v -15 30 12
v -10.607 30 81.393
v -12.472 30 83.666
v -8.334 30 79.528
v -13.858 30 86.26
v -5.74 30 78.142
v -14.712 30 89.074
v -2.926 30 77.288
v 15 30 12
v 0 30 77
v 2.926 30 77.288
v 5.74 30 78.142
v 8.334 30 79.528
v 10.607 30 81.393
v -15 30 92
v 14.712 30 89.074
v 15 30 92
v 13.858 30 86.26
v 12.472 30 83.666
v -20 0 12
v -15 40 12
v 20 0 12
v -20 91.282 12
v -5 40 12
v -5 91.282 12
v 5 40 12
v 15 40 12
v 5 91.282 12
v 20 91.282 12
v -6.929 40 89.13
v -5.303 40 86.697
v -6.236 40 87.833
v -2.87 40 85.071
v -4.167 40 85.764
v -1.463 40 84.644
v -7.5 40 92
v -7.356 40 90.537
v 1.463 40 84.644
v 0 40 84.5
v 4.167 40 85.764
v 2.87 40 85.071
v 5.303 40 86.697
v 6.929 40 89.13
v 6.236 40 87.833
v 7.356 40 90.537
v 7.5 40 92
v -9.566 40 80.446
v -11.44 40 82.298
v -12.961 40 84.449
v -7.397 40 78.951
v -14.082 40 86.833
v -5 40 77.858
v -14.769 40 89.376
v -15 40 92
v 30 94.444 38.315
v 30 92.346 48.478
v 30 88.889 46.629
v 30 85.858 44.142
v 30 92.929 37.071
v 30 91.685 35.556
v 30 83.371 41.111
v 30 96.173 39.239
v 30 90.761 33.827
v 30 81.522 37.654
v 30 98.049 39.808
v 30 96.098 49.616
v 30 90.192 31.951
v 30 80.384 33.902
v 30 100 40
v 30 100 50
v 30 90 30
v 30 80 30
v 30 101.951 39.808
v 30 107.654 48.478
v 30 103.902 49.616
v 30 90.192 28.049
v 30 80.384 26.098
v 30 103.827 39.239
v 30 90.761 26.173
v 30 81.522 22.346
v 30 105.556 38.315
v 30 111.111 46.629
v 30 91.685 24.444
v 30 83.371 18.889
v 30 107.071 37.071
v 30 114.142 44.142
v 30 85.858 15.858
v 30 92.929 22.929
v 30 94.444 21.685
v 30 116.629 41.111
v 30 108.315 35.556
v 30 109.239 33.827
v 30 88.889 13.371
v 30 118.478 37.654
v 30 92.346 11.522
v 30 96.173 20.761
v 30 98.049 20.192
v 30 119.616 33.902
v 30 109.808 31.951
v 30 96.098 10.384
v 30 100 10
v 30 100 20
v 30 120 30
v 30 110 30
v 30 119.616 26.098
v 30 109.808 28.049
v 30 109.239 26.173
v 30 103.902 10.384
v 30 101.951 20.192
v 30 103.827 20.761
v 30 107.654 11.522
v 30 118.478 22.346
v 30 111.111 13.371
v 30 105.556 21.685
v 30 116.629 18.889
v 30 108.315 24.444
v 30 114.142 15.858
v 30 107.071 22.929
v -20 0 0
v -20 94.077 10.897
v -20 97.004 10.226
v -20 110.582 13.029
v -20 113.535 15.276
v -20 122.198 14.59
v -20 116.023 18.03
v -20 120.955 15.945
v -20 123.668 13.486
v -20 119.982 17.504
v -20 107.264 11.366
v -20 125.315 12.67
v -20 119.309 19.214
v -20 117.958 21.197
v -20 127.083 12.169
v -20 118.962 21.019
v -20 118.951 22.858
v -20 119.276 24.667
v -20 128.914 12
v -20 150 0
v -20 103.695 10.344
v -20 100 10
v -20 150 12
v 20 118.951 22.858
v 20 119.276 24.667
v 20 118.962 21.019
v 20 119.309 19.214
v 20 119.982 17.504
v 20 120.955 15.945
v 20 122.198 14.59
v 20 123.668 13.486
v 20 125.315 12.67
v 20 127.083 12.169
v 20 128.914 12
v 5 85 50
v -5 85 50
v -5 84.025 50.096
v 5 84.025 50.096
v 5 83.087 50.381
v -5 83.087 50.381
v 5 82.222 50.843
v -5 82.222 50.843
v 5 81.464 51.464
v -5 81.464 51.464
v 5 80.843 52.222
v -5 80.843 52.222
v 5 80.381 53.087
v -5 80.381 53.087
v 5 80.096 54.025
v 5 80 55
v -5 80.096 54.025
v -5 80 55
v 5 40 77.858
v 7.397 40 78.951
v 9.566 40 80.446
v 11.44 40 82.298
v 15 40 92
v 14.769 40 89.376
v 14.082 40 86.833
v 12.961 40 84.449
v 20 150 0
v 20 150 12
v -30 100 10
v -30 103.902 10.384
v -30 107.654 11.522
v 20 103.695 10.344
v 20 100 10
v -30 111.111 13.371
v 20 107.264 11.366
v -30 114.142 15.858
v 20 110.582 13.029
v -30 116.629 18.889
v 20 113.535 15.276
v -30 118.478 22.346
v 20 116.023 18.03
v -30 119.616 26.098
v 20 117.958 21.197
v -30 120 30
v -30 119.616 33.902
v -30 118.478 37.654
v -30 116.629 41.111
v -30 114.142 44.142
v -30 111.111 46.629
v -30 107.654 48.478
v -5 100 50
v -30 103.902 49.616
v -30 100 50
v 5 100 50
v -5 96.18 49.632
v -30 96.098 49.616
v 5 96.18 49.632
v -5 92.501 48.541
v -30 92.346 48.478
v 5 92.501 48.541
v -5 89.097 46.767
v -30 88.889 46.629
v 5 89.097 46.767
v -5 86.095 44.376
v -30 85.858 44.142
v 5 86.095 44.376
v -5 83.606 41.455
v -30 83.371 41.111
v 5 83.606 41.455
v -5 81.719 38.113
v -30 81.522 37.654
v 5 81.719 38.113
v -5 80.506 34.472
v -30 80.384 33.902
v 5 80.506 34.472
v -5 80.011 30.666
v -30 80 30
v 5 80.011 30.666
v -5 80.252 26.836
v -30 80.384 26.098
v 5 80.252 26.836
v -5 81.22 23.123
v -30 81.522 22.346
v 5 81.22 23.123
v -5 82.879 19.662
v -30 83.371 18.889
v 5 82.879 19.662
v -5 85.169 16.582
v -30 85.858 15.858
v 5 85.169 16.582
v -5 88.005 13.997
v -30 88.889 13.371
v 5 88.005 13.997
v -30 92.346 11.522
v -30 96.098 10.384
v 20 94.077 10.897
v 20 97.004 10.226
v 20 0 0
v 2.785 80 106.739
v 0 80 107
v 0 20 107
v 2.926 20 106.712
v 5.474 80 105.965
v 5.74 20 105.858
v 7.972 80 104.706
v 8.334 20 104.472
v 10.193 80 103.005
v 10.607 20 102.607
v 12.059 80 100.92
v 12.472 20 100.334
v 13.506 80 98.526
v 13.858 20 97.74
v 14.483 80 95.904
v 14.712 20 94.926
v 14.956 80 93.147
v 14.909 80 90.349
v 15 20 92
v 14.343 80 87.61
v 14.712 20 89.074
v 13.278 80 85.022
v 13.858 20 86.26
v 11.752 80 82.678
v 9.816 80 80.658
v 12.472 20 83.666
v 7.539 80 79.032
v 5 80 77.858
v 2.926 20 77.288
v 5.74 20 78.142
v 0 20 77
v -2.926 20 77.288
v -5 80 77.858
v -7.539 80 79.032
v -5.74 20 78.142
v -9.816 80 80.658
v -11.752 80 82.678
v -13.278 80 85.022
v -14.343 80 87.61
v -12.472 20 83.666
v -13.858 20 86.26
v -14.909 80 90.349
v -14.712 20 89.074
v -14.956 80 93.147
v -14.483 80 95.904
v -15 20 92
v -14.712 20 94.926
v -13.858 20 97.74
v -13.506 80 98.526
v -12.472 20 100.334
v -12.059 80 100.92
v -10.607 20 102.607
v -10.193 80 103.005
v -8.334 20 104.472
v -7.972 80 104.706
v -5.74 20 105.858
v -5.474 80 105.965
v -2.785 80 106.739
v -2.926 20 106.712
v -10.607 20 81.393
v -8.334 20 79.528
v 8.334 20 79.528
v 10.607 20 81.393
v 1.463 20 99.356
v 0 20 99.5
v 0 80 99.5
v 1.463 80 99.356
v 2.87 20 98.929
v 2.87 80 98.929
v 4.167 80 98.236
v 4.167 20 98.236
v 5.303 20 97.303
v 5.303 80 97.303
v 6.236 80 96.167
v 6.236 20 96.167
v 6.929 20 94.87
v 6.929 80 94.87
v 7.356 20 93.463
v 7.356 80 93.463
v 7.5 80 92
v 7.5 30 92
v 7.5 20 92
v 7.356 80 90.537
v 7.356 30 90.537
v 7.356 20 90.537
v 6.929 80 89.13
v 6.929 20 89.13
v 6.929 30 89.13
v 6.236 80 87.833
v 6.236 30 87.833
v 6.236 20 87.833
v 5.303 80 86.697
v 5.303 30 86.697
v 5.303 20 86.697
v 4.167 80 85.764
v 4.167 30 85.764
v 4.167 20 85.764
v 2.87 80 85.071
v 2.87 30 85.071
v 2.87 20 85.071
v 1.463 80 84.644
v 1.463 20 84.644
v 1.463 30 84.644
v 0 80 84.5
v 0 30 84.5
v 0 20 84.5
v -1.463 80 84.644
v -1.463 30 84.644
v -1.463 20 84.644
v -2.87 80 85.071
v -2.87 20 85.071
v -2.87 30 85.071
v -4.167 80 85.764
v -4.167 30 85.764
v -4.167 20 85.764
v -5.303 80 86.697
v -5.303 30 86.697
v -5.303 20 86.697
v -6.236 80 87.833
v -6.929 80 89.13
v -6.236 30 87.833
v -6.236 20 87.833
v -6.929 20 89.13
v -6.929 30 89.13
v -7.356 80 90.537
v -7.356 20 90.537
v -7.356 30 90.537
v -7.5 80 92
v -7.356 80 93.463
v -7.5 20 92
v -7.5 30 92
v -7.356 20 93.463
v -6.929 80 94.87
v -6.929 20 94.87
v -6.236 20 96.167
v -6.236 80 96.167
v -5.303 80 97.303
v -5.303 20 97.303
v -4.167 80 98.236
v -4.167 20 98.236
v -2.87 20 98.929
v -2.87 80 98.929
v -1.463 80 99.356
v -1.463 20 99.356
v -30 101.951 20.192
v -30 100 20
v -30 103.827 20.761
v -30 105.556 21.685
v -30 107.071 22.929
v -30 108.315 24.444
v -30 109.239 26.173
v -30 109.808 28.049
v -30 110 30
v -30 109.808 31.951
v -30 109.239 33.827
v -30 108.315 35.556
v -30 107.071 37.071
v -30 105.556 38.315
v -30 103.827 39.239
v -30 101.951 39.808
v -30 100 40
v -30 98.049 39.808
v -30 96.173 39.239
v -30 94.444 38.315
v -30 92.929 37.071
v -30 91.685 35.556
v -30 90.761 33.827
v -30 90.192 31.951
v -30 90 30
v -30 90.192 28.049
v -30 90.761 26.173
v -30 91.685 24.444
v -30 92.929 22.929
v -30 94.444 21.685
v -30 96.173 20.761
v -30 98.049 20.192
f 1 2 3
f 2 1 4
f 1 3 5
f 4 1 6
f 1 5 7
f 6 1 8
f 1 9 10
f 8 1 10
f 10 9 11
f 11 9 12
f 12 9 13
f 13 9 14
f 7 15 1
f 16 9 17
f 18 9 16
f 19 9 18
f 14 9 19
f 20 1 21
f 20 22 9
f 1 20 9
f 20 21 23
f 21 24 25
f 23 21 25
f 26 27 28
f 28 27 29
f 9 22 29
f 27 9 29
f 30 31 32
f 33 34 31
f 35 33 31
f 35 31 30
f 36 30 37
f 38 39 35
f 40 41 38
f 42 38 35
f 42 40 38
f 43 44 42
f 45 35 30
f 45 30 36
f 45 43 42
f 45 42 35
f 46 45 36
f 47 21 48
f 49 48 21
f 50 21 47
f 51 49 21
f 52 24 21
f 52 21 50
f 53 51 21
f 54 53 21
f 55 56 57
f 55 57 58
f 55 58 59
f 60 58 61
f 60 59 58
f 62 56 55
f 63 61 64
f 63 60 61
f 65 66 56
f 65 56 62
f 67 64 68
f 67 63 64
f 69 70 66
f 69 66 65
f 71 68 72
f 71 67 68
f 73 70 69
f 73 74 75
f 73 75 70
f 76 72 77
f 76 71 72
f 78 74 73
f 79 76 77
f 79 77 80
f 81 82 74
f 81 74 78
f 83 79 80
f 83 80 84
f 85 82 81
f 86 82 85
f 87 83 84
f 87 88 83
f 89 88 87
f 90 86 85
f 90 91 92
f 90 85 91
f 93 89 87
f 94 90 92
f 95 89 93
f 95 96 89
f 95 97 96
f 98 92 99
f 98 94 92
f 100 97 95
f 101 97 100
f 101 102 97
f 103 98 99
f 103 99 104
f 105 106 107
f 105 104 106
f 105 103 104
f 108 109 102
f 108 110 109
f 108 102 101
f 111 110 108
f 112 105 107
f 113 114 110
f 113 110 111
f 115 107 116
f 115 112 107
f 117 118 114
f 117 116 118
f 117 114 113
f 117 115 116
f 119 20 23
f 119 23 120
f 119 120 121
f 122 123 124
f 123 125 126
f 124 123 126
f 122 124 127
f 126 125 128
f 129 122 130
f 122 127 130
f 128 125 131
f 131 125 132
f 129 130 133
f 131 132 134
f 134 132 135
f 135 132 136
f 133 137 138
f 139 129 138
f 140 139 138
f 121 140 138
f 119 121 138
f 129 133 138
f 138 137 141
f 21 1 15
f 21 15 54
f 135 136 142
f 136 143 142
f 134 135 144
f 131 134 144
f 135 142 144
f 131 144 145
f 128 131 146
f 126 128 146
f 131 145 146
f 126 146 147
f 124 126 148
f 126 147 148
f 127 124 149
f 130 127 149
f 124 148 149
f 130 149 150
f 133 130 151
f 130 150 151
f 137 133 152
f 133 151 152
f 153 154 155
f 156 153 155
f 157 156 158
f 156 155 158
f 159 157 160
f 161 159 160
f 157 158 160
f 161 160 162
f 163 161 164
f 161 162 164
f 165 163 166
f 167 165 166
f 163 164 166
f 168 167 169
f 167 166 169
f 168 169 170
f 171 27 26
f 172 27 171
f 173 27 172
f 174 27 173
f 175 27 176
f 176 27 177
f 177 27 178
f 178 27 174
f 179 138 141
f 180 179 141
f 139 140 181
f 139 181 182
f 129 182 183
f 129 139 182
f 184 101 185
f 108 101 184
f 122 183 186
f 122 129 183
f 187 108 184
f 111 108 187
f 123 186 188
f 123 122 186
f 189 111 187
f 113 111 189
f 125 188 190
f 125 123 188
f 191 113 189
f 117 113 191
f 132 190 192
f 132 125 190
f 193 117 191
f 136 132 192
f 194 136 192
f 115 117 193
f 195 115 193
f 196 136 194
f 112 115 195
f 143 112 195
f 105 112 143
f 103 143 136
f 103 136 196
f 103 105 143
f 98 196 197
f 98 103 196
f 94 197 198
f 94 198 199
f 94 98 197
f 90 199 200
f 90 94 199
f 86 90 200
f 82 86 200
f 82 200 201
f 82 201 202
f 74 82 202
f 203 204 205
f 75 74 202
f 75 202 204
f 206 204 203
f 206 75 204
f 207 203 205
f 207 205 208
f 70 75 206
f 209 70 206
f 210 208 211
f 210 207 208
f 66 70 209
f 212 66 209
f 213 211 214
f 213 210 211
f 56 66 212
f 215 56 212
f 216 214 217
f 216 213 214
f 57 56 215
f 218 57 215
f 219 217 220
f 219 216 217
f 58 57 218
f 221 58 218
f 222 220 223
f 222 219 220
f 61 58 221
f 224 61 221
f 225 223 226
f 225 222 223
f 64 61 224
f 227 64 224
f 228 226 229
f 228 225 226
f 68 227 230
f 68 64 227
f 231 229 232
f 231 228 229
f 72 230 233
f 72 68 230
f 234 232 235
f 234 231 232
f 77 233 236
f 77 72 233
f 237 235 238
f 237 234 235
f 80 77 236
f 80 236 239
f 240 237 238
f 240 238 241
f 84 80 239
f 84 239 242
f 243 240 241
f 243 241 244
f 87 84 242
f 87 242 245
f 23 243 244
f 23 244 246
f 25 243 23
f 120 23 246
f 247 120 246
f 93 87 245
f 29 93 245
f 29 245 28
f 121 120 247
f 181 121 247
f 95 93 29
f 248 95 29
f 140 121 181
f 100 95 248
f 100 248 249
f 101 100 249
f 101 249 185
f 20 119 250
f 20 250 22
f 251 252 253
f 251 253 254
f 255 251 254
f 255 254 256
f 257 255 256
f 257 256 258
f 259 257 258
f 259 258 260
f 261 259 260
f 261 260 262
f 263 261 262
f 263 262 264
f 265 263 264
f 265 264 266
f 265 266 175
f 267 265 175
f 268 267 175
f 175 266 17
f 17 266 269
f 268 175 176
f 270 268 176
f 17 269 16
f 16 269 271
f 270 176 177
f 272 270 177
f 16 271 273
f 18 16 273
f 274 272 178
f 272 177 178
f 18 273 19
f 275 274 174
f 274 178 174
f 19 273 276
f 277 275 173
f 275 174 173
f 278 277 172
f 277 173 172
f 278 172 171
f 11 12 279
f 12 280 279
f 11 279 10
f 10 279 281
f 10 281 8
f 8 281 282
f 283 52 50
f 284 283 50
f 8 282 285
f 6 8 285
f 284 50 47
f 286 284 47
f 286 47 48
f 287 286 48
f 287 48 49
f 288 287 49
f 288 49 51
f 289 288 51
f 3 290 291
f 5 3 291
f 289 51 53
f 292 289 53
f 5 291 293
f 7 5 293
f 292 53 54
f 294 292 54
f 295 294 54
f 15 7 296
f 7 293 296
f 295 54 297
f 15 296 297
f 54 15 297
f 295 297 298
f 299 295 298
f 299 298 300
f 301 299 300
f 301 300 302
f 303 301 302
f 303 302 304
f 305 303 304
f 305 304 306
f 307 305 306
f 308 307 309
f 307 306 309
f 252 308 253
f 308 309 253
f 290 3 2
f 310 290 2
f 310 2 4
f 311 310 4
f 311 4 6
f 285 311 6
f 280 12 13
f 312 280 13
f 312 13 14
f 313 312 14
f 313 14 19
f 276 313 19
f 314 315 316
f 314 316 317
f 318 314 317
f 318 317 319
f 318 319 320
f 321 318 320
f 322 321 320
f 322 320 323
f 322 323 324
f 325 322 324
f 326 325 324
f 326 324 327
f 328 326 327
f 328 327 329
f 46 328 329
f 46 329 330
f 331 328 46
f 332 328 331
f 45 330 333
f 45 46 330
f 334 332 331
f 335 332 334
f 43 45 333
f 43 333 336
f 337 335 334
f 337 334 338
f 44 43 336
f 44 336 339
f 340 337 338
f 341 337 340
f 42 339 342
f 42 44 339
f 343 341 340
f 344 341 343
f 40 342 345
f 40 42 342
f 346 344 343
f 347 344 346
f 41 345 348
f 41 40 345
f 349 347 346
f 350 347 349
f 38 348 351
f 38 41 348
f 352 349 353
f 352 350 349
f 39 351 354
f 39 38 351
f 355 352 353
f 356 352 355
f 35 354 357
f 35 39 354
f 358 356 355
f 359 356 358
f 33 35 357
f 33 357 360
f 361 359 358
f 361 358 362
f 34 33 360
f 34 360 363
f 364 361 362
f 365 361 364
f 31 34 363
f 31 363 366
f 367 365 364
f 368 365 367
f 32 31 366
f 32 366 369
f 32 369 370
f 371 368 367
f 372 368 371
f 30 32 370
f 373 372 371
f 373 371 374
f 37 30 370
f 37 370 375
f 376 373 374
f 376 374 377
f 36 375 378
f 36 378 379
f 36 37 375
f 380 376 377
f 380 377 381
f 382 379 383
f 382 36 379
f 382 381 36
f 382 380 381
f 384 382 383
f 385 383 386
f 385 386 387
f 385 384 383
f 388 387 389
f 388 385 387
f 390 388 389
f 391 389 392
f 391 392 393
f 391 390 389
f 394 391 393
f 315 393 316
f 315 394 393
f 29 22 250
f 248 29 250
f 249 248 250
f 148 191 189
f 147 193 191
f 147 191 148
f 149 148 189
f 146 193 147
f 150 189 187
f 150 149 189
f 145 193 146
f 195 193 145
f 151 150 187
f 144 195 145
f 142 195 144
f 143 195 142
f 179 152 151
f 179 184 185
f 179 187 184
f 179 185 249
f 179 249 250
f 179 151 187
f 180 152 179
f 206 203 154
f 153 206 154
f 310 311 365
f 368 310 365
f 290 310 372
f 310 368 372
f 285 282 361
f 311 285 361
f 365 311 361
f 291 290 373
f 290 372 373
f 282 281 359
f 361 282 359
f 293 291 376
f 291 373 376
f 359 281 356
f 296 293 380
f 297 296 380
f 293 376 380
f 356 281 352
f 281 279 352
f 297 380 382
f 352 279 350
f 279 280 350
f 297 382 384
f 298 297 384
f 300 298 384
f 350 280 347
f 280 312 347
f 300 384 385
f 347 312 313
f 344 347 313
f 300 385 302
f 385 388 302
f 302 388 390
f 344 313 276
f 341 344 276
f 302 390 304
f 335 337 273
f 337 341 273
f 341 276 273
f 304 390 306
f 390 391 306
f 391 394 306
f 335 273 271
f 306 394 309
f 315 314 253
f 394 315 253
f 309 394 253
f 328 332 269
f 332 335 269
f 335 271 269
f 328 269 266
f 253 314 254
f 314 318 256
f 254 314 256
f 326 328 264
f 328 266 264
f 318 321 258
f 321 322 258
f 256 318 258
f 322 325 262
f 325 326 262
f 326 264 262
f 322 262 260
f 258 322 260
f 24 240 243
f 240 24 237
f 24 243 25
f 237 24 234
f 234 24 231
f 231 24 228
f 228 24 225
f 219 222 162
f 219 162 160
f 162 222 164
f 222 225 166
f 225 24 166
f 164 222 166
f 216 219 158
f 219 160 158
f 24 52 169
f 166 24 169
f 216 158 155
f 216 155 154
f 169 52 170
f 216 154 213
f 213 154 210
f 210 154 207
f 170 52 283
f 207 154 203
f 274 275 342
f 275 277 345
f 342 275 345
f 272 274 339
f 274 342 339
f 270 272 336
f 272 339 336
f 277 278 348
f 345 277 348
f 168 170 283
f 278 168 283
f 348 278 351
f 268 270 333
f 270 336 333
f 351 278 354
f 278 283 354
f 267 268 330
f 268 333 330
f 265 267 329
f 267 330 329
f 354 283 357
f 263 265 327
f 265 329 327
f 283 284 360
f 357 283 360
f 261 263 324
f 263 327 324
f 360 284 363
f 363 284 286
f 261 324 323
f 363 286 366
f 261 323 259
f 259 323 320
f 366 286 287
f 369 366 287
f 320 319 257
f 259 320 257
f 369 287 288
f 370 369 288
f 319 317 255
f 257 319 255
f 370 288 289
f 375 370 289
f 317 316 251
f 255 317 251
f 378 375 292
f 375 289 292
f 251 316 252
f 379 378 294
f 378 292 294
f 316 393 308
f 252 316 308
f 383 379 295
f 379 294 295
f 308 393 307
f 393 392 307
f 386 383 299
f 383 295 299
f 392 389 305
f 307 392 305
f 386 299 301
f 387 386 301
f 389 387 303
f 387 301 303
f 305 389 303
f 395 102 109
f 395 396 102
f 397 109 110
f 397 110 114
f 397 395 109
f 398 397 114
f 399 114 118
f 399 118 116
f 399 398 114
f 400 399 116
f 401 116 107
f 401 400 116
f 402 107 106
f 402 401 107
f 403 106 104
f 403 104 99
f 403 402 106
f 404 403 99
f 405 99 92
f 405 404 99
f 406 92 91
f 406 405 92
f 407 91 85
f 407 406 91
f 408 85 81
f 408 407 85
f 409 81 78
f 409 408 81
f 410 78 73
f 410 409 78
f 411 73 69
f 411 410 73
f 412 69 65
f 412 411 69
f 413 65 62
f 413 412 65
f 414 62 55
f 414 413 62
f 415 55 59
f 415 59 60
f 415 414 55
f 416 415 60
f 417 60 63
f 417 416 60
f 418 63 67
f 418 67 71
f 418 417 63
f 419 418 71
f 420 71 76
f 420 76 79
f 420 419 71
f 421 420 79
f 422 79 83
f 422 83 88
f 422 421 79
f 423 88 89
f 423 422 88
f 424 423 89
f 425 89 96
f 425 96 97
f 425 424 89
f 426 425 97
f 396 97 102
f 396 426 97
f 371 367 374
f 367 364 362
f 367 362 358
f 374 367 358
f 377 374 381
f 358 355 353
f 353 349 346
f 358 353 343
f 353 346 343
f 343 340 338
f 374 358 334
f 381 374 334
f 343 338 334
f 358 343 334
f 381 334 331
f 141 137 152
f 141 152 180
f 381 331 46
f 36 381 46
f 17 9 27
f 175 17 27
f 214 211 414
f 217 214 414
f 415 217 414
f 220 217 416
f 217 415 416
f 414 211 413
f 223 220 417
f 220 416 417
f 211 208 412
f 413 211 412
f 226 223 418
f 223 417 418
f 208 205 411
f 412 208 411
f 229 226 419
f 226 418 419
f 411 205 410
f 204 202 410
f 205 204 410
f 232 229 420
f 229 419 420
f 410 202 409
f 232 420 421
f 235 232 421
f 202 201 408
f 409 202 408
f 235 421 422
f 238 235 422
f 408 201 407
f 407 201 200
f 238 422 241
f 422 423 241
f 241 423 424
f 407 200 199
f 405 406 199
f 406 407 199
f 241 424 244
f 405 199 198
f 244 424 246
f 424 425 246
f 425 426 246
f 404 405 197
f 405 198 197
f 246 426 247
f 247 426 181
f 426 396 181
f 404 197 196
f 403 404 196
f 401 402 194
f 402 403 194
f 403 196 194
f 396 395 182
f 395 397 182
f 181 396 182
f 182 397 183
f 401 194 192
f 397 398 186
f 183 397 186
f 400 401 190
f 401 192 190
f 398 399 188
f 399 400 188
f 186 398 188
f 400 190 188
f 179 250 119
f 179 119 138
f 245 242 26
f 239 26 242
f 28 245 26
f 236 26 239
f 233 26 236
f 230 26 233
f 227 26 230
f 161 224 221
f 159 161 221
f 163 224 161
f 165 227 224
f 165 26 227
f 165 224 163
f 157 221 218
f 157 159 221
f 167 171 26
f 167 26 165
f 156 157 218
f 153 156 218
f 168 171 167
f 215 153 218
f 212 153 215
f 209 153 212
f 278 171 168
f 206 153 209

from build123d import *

# Parameters (mm, degrees)
SKETCH1_W                = 150
SKETCH1_H                = 12
BOSS_EXTRUDE1_DEPTH      = 20
SKETCH2_R                = 20
SKETCH2_R_2              = 10
BOSS_EXTRUDE2_DEPTH      = 30
FILLET1_R                = 10
SKETCH3_W                = 10
SKETCH3_H                = 80
BOSS_EXTRUDE3_DEPTH      = 15
BOSS_EXTRUDE4_DEPTH      = 40
BOSS_EXTRUDE4_DEPTH_BACK = 20
SKETCH4_R                = 15
SKETCH4_R_2              = 7.5
RIB1_START               = -5
RIB1_DEPTH               = 10


# Read off the part's stored shape, not the designer's step: Rib1
with BuildPart() as part:
    # Sketch1 → Boss-Extrude1 (new, symmetric)
    with BuildSketch(Plane.YZ):
        with Locations((75, 6)):
            Rectangle(SKETCH1_W, SKETCH1_H)
    extrude(amount=BOSS_EXTRUDE1_DEPTH, both=True)

    # Sketch2 → Boss-Extrude2 (add, symmetric)
    with BuildSketch(Plane.YZ):
        with Locations(Location((100, 30, 0), (0, 0, 270))):
            Circle(SKETCH2_R)
        with Locations(Location((100, 30, 0), (0, 0, 270))):
            Circle(SKETCH2_R_2, mode=Mode.SUBTRACT)
    extrude(amount=BOSS_EXTRUDE2_DEPTH, both=True)

    # Fillet1
    fillet1_edges = [part.edges().sort_by_distance(p)[0] for p in [
        (0, 108.717797887, 12),
    ]]
    fillet(fillet1_edges, radius=FILLET1_R)

    # Sketch3 → Boss-Extrude3 (add, symmetric)
    with BuildSketch(Plane.YZ):
        with Locations((35, 52)):
            Rectangle(SKETCH3_W, SKETCH3_H)
    extrude(amount=BOSS_EXTRUDE3_DEPTH, both=True)

    # Sketch4 → Boss-Extrude4 (add, two sides: drawn at the far end of the back side and taken through both)
    with BuildSketch(Plane(origin=(0, 40, 0), x_dir=(-1, 0, 0), z_dir=(0, 1, 0)).offset(-BOSS_EXTRUDE4_DEPTH_BACK)):
        with Locations(Location((0, 92, 0), (0, 0, 90))):
            Circle(SKETCH4_R)
        with Locations(Location((0, 92, 0), (0, 0, 90))):
            Circle(SKETCH4_R_2, mode=Mode.SUBTRACT)
    extrude(amount=BOSS_EXTRUDE4_DEPTH + BOSS_EXTRUDE4_DEPTH_BACK)

    # Rib1 outline → Rib1 (add)
    with BuildSketch(Plane.YZ.offset(RIB1_START)):
        with BuildLine():
            ThreePointArc((85, 50), (81.464466094, 51.464466094), (80, 55))
            Line((80, 55), (80, 79))
            Line((80, 79), (40, 79))
            Line((40, 79), (40, 12))
            Line((40, 12), (91.282202113, 12))
            ThreePointArc((91.282202113, 12), (80.50641131, 34.472135955), (100, 50))
            Line((100, 50), (85, 50))
        make_face()
    extrude(amount=RIB1_DEPTH)


solid = part.part
